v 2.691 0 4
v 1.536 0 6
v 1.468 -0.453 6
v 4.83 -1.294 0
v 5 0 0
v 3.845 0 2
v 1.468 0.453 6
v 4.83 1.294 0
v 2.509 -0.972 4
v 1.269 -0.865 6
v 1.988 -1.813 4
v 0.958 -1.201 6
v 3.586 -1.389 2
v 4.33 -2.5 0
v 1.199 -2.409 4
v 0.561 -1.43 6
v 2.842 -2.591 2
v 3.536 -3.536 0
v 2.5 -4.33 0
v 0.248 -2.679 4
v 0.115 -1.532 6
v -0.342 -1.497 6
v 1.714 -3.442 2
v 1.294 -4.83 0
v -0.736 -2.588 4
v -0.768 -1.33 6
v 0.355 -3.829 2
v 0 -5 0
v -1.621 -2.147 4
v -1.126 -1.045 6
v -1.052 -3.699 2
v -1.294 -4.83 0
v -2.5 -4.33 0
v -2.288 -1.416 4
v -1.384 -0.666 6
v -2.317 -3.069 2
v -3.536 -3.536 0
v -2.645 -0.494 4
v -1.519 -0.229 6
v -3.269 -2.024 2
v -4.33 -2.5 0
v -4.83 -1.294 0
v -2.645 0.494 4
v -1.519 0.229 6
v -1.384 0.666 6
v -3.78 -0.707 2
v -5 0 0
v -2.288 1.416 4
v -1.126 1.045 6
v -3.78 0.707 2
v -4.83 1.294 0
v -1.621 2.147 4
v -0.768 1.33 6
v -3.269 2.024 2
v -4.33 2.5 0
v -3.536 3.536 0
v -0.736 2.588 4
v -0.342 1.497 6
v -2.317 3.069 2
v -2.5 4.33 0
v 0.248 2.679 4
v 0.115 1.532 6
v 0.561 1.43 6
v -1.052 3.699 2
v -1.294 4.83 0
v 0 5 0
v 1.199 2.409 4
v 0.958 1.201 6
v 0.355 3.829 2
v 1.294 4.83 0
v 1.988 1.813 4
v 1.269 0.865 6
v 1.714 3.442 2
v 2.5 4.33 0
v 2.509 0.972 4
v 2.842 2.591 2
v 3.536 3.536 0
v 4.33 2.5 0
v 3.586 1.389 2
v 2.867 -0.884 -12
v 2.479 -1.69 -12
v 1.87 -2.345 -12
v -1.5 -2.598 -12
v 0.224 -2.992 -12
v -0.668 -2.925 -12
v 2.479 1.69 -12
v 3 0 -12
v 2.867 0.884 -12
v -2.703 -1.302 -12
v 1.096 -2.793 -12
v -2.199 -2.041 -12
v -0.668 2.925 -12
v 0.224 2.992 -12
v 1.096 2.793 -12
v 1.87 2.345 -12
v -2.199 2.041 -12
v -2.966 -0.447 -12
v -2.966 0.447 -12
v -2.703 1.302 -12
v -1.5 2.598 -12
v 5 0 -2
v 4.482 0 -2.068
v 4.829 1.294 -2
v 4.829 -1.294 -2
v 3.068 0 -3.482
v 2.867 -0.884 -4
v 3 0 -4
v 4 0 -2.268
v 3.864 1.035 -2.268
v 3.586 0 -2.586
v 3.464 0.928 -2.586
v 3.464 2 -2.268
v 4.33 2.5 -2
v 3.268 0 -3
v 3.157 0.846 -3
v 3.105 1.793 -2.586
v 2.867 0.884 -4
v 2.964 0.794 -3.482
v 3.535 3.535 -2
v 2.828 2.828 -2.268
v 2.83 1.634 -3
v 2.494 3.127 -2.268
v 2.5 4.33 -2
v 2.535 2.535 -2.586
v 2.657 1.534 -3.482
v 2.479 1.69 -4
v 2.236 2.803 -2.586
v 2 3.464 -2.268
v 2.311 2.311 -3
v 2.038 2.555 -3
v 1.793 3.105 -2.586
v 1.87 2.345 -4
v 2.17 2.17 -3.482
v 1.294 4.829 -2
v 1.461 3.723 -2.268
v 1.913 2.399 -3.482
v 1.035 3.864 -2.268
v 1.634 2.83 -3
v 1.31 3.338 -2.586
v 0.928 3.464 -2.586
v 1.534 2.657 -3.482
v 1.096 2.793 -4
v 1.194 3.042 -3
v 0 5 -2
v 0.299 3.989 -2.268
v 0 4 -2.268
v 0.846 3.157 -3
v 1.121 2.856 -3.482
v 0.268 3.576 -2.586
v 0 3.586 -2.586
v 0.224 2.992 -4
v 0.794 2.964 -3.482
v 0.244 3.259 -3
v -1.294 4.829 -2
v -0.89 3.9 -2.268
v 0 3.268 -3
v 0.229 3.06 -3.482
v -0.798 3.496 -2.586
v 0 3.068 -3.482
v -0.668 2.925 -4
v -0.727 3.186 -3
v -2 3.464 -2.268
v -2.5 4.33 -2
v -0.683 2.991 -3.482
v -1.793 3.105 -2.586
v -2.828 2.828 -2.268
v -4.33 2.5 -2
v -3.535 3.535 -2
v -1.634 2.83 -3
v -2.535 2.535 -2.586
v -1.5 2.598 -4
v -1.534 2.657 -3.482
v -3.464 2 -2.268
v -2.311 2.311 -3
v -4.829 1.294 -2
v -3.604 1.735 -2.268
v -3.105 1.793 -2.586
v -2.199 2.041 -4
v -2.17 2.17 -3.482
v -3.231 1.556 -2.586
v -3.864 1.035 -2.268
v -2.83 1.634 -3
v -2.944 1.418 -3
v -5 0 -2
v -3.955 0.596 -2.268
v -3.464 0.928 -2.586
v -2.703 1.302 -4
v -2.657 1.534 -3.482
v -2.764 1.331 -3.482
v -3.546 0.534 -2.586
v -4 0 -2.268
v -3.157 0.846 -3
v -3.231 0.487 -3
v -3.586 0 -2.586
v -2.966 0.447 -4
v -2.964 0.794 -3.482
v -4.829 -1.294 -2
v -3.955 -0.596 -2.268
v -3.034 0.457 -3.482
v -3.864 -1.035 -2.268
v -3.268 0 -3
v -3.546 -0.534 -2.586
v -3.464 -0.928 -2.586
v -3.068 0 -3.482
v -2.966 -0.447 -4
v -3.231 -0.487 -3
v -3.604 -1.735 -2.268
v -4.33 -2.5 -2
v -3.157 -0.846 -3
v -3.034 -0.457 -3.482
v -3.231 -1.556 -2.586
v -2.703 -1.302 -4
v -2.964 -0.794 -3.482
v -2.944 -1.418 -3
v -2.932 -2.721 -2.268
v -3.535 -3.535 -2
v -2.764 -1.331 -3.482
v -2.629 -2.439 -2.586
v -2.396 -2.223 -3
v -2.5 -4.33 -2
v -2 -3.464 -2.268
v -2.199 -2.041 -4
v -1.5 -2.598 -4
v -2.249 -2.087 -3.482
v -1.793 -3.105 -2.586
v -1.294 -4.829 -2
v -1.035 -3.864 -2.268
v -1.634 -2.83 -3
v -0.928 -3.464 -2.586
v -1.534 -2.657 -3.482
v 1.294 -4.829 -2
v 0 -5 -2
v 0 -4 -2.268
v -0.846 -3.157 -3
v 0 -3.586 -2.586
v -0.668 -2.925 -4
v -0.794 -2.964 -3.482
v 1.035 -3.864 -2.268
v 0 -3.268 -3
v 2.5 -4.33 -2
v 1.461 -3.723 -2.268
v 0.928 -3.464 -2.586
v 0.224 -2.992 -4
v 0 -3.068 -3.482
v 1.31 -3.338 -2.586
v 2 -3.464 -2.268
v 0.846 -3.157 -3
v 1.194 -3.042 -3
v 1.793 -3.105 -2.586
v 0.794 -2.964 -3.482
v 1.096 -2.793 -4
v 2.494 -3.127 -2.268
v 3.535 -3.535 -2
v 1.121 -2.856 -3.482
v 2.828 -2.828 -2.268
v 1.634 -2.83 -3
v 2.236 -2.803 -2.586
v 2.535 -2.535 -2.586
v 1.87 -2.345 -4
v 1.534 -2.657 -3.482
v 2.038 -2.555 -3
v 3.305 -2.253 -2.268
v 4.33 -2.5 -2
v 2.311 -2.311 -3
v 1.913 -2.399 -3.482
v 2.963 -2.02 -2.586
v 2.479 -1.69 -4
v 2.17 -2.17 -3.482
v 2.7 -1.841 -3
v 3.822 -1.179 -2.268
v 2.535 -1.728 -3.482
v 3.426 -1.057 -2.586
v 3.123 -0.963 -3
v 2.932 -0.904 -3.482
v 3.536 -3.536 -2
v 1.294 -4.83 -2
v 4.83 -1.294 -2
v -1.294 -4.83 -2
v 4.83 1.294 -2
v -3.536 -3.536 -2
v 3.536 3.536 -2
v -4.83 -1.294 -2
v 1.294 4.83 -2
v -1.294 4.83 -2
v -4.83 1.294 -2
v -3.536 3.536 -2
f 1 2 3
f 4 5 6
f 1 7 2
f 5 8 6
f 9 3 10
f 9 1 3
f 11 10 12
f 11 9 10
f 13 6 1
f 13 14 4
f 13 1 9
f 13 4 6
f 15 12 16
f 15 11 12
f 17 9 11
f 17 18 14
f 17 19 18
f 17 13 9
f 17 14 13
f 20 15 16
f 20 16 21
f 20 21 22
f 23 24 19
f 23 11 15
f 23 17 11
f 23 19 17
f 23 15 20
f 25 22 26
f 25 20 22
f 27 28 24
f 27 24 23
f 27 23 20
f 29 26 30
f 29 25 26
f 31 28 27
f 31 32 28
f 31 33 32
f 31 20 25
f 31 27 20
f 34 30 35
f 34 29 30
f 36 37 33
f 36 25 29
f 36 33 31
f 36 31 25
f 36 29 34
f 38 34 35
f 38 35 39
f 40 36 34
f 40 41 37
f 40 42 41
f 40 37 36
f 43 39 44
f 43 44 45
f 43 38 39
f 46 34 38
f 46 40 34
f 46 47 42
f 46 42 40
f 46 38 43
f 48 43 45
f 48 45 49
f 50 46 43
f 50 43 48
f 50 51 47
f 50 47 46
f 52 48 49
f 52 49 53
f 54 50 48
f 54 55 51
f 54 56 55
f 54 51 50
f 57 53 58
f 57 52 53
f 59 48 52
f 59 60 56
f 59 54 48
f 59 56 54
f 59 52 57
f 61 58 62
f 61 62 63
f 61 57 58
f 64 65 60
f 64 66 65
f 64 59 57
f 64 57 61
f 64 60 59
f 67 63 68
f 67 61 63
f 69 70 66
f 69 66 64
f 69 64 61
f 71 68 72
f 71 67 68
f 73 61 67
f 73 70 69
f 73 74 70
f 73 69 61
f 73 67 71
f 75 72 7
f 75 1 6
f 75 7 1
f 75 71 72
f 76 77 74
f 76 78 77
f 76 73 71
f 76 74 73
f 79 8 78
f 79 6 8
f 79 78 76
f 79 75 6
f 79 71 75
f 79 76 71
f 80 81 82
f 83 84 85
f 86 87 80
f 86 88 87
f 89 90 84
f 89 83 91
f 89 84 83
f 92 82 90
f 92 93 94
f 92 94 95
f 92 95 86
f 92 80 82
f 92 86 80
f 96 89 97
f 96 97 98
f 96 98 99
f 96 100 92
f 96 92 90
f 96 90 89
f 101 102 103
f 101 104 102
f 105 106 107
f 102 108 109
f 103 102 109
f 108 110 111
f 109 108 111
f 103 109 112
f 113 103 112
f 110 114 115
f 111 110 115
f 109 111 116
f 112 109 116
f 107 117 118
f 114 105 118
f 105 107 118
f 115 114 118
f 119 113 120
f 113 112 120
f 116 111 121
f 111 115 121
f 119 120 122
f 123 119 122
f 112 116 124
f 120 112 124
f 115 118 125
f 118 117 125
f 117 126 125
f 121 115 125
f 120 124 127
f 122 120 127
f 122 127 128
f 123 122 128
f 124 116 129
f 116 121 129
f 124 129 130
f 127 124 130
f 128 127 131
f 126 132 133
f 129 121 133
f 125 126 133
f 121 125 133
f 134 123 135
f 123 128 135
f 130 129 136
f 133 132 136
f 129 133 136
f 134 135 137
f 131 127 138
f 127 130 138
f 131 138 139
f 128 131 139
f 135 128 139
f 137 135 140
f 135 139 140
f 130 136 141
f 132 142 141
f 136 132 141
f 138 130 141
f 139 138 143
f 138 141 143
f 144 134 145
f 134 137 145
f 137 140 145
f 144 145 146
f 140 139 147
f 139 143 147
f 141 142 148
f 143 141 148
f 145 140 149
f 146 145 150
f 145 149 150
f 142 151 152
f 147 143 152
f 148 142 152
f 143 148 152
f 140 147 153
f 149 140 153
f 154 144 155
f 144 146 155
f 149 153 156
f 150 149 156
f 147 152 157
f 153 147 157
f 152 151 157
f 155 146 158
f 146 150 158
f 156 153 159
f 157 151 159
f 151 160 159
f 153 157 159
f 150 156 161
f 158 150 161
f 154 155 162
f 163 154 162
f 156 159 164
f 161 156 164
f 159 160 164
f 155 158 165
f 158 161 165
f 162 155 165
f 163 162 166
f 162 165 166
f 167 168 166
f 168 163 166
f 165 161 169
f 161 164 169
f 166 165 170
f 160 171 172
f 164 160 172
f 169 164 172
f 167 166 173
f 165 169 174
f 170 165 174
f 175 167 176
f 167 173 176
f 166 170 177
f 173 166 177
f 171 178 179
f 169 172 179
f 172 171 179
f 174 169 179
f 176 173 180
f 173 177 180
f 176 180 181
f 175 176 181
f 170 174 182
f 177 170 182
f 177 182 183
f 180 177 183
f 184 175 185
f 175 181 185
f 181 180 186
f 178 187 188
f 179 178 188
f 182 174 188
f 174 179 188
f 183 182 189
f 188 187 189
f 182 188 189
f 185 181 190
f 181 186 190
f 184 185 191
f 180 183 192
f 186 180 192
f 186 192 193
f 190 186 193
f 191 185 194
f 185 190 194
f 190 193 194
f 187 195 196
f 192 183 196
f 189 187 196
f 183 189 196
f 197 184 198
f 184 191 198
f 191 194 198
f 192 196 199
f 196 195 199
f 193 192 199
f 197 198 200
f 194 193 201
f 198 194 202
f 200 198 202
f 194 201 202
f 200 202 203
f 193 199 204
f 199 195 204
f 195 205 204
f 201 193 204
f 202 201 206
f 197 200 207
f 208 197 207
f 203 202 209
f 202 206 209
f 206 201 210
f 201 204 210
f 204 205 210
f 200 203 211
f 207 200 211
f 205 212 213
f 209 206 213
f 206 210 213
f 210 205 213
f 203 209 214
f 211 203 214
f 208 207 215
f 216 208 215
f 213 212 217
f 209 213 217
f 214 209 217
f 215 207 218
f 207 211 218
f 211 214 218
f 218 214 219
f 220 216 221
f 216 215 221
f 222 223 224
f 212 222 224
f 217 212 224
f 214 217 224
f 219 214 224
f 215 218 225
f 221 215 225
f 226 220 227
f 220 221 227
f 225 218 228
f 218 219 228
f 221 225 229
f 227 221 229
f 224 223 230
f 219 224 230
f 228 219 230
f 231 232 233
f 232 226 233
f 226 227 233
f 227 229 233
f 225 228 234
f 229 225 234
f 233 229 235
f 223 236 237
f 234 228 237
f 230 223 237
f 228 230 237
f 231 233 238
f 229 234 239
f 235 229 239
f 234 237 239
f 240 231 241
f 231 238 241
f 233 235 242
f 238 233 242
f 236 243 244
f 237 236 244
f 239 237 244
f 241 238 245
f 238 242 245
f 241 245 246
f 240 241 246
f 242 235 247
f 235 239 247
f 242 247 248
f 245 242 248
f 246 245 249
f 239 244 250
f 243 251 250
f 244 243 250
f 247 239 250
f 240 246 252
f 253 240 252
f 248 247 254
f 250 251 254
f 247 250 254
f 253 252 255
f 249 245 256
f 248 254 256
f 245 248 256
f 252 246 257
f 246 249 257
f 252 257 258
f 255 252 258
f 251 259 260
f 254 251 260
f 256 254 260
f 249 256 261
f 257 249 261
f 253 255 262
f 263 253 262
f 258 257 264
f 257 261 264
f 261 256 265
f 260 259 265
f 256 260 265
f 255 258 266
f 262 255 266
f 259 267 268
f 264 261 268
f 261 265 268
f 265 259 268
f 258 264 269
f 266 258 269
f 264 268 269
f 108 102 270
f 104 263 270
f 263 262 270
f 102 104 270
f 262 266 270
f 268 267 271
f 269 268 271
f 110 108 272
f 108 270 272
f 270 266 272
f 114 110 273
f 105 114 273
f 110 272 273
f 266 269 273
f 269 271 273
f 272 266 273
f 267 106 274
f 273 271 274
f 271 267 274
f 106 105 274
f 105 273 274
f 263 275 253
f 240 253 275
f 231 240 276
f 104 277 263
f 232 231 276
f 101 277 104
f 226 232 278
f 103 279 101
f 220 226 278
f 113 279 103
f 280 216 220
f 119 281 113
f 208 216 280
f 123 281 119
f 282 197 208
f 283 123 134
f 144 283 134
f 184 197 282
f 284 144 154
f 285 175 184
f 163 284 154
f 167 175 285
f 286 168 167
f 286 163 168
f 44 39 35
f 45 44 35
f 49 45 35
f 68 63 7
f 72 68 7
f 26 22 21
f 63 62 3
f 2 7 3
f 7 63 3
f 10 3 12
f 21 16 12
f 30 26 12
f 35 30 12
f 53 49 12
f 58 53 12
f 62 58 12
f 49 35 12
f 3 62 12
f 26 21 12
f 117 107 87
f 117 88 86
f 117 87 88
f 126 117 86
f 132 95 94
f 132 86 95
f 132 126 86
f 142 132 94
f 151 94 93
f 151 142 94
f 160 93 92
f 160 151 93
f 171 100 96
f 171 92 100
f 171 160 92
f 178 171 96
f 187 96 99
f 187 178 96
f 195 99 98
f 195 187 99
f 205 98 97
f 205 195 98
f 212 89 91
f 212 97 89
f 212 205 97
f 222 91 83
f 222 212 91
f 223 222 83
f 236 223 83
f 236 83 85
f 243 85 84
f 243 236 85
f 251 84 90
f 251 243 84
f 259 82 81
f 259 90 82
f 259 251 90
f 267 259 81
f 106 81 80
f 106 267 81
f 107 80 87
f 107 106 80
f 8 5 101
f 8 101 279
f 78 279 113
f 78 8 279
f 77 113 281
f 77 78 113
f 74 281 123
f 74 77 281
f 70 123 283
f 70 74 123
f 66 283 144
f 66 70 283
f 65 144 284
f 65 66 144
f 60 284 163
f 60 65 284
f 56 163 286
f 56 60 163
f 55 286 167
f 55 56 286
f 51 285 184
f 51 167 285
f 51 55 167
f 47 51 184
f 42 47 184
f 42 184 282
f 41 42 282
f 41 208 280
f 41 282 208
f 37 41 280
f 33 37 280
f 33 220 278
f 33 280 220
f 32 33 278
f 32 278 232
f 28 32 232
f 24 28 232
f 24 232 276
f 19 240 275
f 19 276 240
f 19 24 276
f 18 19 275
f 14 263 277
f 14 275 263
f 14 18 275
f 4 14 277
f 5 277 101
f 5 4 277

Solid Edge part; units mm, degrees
sketch "Sketch1" plane through (0, 0, 0) normal (0, -1, 0) x (1, 0, 0)
  line L0 (0, 6) -> (1.5359, 6)
  line L1 (1.5359, 6) -> (5, 0)
  line L2 (5, 0) -> (0, 0)
  line L3 (0, 0) -> (0, 6)
  dimension "D1" = 6
revolve "RevolvedProtrusion1" add sketch "Sketch1" angle 360 about axis through (0, 0, 54) along (0, 0, -1)
sketch "Sketch2" plane through (0, 0, 0) normal (0, 0, -1) x (1, 0, 0)
  circle A0 centre (0, 0) radius 5
extrude "Protrusion1" add sketch "Sketch2" along normal blind 2
sketch "Sketch3" plane through (0, 0, -2) normal (0, 0, -1) x (1, 0, 0)
  circle A0 centre (0, 0) radius 3
  dimension "D1" = 6
extrude "ExtrudedProtrusion_2" add sketch "Sketch3" along normal blind 10
fillet "Round_1" radius 2 1 edges at (-3, 0, -2)
properties material "Stainless steel"
